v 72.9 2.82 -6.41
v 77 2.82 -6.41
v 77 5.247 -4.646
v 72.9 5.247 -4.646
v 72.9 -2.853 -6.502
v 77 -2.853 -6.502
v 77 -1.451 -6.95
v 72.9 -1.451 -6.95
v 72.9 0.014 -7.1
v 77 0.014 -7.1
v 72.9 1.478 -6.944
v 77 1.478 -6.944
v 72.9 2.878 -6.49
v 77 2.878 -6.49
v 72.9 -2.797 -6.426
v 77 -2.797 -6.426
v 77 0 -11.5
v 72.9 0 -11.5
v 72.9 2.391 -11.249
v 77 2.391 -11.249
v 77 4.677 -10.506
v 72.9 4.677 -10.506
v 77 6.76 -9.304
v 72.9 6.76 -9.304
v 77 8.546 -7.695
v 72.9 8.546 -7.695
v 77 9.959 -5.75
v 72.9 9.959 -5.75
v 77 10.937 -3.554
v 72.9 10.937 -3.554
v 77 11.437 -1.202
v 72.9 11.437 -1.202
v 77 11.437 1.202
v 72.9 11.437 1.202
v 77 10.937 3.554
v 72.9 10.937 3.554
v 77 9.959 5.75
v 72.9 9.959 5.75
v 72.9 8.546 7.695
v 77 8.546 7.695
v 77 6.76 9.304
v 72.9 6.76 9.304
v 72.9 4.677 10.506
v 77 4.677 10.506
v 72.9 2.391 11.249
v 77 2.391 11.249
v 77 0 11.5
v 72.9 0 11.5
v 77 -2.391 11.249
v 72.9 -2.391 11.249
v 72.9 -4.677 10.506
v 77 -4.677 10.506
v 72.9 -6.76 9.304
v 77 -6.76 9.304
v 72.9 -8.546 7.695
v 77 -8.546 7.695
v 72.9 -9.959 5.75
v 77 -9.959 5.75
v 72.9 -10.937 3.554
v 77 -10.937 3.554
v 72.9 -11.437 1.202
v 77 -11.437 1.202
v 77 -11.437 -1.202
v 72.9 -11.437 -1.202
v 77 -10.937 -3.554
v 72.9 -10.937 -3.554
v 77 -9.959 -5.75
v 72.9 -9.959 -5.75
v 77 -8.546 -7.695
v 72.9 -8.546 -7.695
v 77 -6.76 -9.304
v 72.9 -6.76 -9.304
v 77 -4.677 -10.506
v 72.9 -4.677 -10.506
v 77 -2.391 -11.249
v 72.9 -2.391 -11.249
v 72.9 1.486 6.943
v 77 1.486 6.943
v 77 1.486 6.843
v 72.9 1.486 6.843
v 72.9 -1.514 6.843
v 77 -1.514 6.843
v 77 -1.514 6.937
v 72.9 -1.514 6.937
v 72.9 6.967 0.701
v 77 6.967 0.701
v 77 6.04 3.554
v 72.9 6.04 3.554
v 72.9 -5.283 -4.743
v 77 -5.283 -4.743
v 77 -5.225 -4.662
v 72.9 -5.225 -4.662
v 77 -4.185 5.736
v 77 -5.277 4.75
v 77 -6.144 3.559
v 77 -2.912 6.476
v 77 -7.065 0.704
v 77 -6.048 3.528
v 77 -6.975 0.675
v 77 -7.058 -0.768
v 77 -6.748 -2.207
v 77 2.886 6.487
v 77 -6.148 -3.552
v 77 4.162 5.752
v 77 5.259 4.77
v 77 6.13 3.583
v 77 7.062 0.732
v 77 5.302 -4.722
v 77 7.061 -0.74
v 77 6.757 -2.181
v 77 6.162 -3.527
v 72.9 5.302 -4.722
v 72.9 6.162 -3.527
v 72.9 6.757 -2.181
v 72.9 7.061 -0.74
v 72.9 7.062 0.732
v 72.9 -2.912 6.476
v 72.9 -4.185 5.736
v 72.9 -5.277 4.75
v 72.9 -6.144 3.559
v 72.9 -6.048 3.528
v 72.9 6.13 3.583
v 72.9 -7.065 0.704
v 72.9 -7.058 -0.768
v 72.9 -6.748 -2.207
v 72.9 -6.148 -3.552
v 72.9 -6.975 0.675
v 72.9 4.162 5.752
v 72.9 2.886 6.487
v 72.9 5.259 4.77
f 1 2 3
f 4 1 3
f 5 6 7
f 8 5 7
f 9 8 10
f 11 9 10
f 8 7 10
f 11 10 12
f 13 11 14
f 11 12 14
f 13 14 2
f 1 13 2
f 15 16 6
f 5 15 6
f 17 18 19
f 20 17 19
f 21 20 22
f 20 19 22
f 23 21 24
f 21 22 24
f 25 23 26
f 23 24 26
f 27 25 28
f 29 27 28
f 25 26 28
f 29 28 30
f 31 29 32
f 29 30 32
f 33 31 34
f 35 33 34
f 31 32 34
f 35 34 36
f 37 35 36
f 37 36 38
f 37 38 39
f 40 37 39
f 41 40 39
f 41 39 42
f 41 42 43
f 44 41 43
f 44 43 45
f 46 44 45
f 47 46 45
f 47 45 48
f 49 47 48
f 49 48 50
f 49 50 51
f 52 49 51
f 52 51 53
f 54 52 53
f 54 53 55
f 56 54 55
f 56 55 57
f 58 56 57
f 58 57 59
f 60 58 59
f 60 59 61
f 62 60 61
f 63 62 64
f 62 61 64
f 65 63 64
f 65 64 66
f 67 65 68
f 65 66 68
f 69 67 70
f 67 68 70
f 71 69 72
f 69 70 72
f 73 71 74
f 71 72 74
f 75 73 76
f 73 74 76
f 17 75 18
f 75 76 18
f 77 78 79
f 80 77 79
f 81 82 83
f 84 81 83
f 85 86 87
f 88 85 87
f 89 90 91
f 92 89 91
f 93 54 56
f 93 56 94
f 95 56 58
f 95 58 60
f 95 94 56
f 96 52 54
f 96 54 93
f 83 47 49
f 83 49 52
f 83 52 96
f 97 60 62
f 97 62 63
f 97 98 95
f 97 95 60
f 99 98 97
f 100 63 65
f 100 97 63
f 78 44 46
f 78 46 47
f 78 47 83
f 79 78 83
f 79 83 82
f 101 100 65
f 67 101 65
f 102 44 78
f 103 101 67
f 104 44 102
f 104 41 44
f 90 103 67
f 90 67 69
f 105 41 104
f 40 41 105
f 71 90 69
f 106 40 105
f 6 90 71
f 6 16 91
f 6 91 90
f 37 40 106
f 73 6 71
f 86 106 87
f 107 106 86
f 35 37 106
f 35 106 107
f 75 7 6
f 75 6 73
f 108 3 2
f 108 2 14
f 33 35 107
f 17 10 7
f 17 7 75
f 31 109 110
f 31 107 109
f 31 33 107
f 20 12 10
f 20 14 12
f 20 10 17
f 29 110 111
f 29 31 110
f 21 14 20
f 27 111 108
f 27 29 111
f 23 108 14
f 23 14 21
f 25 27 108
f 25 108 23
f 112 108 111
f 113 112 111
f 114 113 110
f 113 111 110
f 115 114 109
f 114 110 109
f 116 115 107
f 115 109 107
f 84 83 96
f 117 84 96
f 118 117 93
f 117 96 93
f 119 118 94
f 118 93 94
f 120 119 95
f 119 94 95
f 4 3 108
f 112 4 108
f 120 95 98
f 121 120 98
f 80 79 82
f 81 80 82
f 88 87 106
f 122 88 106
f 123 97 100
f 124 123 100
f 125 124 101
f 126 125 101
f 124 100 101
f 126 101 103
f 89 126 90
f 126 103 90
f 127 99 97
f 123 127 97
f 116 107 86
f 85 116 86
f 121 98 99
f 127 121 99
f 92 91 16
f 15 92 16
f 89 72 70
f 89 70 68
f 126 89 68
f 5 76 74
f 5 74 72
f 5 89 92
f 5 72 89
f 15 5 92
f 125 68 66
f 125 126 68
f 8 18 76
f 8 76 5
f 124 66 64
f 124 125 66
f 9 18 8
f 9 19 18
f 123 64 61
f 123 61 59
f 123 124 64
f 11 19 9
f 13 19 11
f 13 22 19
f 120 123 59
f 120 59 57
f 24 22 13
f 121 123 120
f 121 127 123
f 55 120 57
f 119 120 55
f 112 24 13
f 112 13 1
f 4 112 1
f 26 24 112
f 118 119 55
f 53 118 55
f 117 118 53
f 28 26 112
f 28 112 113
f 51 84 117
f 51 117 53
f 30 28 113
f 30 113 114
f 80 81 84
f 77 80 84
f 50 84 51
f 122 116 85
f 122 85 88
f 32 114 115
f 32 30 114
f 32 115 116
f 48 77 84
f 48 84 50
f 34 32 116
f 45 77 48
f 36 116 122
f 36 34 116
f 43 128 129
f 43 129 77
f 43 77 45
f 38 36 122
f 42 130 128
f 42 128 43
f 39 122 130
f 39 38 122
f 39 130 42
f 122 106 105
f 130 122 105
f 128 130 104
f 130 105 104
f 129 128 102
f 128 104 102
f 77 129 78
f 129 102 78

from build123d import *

# Parameters (mm, degrees)
SKIZZE1_R                        = 11.5
AUFSATZ_LINEAR_AUSTRAGEN1_DEPTH  = 77
SCHNITT_LINEAR_AUSTRAGEN1_DEPTH  = 4.1
SKIZZE3_R                        = 2.1
SCHNITT_LINEAR_AUSTRAGEN2_DEPTH  = 3
SKIZZE4_R                        = 9.6
SCHNITT_LINEAR_AUSTRAGEN3_DEPTH  = 12.75
SCHNITT_LINEAR_START             = -6
SKIZZE7_W                        = 1.5
SKIZZE7_H                        = 15
SCHNITT_LINEAR_AUSTRAGEN4_DEPTH  = 63
SKIZZE8_W                        = 63
SKIZZE8_H                        = 4
AUFSATZ_LINEAR_AUSTRAGEN2_DEPTH  = 1.5
SCHNITT_LINEAR_AUSTRAGEN6_DEPTH  = 13.5
SKIZZE12_R                       = 3
SCHNITT_LINEAR_AUSTRAGEN7_DEPTH  = 2
KREISMUSTER3_COUNT               = 3
SKIZZE13_R                       = 8.5
SCHNITT_LINEAR_AUSTRAGEN8_DEPTH  = 40
SKIZZE15_R                       = 14.336938481
SCHNITT_LINEAR_AUSTRAGEN10_DEPTH = 72.9


with BuildPart() as part:
    # Skizze1 → Aufsatz-Linear austragen1 (new body)
    with BuildSketch(Plane(origin=(0, 0, 0), x_dir=(0, 0, -1), z_dir=(1, 0, 0))):
        Circle(SKIZZE1_R)
    extrude(amount=AUFSATZ_LINEAR_AUSTRAGEN1_DEPTH)

    # Skizze2 → Schnitt-Linear austragen1 (cut)
    with BuildSketch(Plane(origin=(77, 0, 0), x_dir=(0, 0, -1), z_dir=(1, 0, 0))):
        with BuildLine():
            Line((-6.942668977, 1.486387391), (-6.842668977, 1.486387391))
            Line((-6.842668977, 1.486387391), (-6.842668977, -1.513612609))
            Line((-6.842668977, -1.513612609), (-6.936784332, -1.513612609))
            ThreePointArc((-6.936784332, -1.513612609), (-5.735823545, -4.184534414), (-3.559041115, -6.143551607))
            Line((-3.559041115, -6.143551607), (-3.528139415, -6.048445955))
            Line((-3.528139415, -6.048445955), (-0.674969866, -6.975496938))
            Line((-0.674969866, -6.975496938), (-0.70405311, -7.06500596))
            ThreePointArc((-0.70405311, -7.06500596), (2.207261771, -6.748184606), (4.743060601, -5.283311096))
            Line((4.743060601, -5.283311096), (4.662158901, -5.224532571))
            Line((4.662158901, -5.224532571), (6.425514658, -2.797481588))
            Line((6.425514658, -2.797481588), (6.50165558, -2.852801206))
            ThreePointArc((6.50165558, -2.852801206), (7.099986341, 0.013926966), (6.490413777, 2.878285776))
            Line((6.490413777, 2.878285776), (6.409512077, 2.819507251))
            Line((6.409512077, 2.819507251), (4.64615632, 5.246558234))
            Line((4.64615632, 5.246558234), (4.722297242, 5.301877852))
            ThreePointArc((4.722297242, 5.301877852), (2.180771108, 6.756791944), (-0.731764286, 7.062189535))
            Line((-0.731764286, 7.062189535), (-0.700862586, 6.967083883))
            Line((-0.700862586, 6.967083883), (-3.554032135, 6.0400329))
            Line((-3.554032135, 6.0400329), (-3.583115379, 6.129541922))
            ThreePointArc((-3.583115379, 6.129541922), (-5.752195675, 4.162000111), (-6.942668977, 1.486387391))
        make_face()
    extrude(amount=-SCHNITT_LINEAR_AUSTRAGEN1_DEPTH, mode=Mode.SUBTRACT)

    # Skizze3 → Schnitt-Linear austragen2 (cut)
    with BuildSketch(Plane(origin=(72.9, 0, 0), x_dir=(0, 0, -1), z_dir=(1, 0, 0))):
        Circle(SKIZZE3_R)
    extrude(amount=-SCHNITT_LINEAR_AUSTRAGEN2_DEPTH, mode=Mode.SUBTRACT)

    # Skizze4 → Schnitt-Linear austragen3 (cut)
    with BuildSketch(Plane.ZY):
        Circle(SKIZZE4_R)
    extrude(amount=-SCHNITT_LINEAR_AUSTRAGEN3_DEPTH, mode=Mode.SUBTRACT)

    # Skizze7 → Schnitt-Linear austragen4 (cut)
    with BuildSketch(Plane(origin=(77, 0, 0), x_dir=(0, 0, -1), z_dir=(1, 0, 0)).offset(SCHNITT_LINEAR_START)):
        with Locations((-10.75, 0)):
            Rectangle(SKIZZE7_W, SKIZZE7_H)
    schnitt_linear_austragen4 = extrude(amount=-SCHNITT_LINEAR_AUSTRAGEN4_DEPTH, mode=Mode.SUBTRACT)

    # Skizze8 → Aufsatz-Linear austragen2 (add)
    with BuildSketch(Plane.XY.offset(10)):
        with Locations((39.5, 0)):
            Rectangle(SKIZZE8_W, SKIZZE8_H)
    aufsatz_linear_austragen2 = extrude(amount=AUFSATZ_LINEAR_AUSTRAGEN2_DEPTH)

    # Skizze10 → Schnitt-Linear austragen6 (cut)
    with BuildSketch(Plane.ZY.offset(-12.75)):
        Polygon((4.038863706, -2.240739453), (3.959969143, 2.377388845), (-0.078894563, 4.618128298), (-4.038863706, 2.240739453), (-3.959969143, -2.377388845), (0.078894563, -4.618128298), align=None)
    extrude(amount=-SCHNITT_LINEAR_AUSTRAGEN6_DEPTH, mode=Mode.SUBTRACT)

    # Skizze12 → Schnitt-Linear austragen7 (cut)
    with BuildSketch(Plane.ZY.offset(-26.25)):
        Circle(SKIZZE12_R)
    extrude(amount=-SCHNITT_LINEAR_AUSTRAGEN7_DEPTH, mode=Mode.SUBTRACT)

    # Kreismuster3: Schnitt-Linear austragen4, Aufsatz-Linear austragen2 ×3 about axis
    kreismuster3_axis = Axis((0, 0, 0), (1, 0, 0))
    add([schnitt_linear_austragen4.rotate(kreismuster3_axis, i * 360 / KREISMUSTER3_COUNT) for i in range(1, KREISMUSTER3_COUNT)], mode=Mode.SUBTRACT)
    add([aufsatz_linear_austragen2.rotate(kreismuster3_axis, i * 360 / KREISMUSTER3_COUNT) for i in range(1, KREISMUSTER3_COUNT)])

    # Skizze13 → Schnitt-Linear austragen8 (cut)
    with BuildSketch(Plane(origin=(69.9, 0, 0), x_dir=(0, 0, -1), z_dir=(1, 0, 0))):
        Circle(SKIZZE13_R)
    extrude(amount=-SCHNITT_LINEAR_AUSTRAGEN8_DEPTH, mode=Mode.SUBTRACT)

    # Skizze15 → Schnitt-Linear austragen10 (cut)
    with BuildSketch(Plane.ZY):
        Circle(SKIZZE15_R)
    extrude(amount=-SCHNITT_LINEAR_AUSTRAGEN10_DEPTH, mode=Mode.SUBTRACT)


solid = part.part
